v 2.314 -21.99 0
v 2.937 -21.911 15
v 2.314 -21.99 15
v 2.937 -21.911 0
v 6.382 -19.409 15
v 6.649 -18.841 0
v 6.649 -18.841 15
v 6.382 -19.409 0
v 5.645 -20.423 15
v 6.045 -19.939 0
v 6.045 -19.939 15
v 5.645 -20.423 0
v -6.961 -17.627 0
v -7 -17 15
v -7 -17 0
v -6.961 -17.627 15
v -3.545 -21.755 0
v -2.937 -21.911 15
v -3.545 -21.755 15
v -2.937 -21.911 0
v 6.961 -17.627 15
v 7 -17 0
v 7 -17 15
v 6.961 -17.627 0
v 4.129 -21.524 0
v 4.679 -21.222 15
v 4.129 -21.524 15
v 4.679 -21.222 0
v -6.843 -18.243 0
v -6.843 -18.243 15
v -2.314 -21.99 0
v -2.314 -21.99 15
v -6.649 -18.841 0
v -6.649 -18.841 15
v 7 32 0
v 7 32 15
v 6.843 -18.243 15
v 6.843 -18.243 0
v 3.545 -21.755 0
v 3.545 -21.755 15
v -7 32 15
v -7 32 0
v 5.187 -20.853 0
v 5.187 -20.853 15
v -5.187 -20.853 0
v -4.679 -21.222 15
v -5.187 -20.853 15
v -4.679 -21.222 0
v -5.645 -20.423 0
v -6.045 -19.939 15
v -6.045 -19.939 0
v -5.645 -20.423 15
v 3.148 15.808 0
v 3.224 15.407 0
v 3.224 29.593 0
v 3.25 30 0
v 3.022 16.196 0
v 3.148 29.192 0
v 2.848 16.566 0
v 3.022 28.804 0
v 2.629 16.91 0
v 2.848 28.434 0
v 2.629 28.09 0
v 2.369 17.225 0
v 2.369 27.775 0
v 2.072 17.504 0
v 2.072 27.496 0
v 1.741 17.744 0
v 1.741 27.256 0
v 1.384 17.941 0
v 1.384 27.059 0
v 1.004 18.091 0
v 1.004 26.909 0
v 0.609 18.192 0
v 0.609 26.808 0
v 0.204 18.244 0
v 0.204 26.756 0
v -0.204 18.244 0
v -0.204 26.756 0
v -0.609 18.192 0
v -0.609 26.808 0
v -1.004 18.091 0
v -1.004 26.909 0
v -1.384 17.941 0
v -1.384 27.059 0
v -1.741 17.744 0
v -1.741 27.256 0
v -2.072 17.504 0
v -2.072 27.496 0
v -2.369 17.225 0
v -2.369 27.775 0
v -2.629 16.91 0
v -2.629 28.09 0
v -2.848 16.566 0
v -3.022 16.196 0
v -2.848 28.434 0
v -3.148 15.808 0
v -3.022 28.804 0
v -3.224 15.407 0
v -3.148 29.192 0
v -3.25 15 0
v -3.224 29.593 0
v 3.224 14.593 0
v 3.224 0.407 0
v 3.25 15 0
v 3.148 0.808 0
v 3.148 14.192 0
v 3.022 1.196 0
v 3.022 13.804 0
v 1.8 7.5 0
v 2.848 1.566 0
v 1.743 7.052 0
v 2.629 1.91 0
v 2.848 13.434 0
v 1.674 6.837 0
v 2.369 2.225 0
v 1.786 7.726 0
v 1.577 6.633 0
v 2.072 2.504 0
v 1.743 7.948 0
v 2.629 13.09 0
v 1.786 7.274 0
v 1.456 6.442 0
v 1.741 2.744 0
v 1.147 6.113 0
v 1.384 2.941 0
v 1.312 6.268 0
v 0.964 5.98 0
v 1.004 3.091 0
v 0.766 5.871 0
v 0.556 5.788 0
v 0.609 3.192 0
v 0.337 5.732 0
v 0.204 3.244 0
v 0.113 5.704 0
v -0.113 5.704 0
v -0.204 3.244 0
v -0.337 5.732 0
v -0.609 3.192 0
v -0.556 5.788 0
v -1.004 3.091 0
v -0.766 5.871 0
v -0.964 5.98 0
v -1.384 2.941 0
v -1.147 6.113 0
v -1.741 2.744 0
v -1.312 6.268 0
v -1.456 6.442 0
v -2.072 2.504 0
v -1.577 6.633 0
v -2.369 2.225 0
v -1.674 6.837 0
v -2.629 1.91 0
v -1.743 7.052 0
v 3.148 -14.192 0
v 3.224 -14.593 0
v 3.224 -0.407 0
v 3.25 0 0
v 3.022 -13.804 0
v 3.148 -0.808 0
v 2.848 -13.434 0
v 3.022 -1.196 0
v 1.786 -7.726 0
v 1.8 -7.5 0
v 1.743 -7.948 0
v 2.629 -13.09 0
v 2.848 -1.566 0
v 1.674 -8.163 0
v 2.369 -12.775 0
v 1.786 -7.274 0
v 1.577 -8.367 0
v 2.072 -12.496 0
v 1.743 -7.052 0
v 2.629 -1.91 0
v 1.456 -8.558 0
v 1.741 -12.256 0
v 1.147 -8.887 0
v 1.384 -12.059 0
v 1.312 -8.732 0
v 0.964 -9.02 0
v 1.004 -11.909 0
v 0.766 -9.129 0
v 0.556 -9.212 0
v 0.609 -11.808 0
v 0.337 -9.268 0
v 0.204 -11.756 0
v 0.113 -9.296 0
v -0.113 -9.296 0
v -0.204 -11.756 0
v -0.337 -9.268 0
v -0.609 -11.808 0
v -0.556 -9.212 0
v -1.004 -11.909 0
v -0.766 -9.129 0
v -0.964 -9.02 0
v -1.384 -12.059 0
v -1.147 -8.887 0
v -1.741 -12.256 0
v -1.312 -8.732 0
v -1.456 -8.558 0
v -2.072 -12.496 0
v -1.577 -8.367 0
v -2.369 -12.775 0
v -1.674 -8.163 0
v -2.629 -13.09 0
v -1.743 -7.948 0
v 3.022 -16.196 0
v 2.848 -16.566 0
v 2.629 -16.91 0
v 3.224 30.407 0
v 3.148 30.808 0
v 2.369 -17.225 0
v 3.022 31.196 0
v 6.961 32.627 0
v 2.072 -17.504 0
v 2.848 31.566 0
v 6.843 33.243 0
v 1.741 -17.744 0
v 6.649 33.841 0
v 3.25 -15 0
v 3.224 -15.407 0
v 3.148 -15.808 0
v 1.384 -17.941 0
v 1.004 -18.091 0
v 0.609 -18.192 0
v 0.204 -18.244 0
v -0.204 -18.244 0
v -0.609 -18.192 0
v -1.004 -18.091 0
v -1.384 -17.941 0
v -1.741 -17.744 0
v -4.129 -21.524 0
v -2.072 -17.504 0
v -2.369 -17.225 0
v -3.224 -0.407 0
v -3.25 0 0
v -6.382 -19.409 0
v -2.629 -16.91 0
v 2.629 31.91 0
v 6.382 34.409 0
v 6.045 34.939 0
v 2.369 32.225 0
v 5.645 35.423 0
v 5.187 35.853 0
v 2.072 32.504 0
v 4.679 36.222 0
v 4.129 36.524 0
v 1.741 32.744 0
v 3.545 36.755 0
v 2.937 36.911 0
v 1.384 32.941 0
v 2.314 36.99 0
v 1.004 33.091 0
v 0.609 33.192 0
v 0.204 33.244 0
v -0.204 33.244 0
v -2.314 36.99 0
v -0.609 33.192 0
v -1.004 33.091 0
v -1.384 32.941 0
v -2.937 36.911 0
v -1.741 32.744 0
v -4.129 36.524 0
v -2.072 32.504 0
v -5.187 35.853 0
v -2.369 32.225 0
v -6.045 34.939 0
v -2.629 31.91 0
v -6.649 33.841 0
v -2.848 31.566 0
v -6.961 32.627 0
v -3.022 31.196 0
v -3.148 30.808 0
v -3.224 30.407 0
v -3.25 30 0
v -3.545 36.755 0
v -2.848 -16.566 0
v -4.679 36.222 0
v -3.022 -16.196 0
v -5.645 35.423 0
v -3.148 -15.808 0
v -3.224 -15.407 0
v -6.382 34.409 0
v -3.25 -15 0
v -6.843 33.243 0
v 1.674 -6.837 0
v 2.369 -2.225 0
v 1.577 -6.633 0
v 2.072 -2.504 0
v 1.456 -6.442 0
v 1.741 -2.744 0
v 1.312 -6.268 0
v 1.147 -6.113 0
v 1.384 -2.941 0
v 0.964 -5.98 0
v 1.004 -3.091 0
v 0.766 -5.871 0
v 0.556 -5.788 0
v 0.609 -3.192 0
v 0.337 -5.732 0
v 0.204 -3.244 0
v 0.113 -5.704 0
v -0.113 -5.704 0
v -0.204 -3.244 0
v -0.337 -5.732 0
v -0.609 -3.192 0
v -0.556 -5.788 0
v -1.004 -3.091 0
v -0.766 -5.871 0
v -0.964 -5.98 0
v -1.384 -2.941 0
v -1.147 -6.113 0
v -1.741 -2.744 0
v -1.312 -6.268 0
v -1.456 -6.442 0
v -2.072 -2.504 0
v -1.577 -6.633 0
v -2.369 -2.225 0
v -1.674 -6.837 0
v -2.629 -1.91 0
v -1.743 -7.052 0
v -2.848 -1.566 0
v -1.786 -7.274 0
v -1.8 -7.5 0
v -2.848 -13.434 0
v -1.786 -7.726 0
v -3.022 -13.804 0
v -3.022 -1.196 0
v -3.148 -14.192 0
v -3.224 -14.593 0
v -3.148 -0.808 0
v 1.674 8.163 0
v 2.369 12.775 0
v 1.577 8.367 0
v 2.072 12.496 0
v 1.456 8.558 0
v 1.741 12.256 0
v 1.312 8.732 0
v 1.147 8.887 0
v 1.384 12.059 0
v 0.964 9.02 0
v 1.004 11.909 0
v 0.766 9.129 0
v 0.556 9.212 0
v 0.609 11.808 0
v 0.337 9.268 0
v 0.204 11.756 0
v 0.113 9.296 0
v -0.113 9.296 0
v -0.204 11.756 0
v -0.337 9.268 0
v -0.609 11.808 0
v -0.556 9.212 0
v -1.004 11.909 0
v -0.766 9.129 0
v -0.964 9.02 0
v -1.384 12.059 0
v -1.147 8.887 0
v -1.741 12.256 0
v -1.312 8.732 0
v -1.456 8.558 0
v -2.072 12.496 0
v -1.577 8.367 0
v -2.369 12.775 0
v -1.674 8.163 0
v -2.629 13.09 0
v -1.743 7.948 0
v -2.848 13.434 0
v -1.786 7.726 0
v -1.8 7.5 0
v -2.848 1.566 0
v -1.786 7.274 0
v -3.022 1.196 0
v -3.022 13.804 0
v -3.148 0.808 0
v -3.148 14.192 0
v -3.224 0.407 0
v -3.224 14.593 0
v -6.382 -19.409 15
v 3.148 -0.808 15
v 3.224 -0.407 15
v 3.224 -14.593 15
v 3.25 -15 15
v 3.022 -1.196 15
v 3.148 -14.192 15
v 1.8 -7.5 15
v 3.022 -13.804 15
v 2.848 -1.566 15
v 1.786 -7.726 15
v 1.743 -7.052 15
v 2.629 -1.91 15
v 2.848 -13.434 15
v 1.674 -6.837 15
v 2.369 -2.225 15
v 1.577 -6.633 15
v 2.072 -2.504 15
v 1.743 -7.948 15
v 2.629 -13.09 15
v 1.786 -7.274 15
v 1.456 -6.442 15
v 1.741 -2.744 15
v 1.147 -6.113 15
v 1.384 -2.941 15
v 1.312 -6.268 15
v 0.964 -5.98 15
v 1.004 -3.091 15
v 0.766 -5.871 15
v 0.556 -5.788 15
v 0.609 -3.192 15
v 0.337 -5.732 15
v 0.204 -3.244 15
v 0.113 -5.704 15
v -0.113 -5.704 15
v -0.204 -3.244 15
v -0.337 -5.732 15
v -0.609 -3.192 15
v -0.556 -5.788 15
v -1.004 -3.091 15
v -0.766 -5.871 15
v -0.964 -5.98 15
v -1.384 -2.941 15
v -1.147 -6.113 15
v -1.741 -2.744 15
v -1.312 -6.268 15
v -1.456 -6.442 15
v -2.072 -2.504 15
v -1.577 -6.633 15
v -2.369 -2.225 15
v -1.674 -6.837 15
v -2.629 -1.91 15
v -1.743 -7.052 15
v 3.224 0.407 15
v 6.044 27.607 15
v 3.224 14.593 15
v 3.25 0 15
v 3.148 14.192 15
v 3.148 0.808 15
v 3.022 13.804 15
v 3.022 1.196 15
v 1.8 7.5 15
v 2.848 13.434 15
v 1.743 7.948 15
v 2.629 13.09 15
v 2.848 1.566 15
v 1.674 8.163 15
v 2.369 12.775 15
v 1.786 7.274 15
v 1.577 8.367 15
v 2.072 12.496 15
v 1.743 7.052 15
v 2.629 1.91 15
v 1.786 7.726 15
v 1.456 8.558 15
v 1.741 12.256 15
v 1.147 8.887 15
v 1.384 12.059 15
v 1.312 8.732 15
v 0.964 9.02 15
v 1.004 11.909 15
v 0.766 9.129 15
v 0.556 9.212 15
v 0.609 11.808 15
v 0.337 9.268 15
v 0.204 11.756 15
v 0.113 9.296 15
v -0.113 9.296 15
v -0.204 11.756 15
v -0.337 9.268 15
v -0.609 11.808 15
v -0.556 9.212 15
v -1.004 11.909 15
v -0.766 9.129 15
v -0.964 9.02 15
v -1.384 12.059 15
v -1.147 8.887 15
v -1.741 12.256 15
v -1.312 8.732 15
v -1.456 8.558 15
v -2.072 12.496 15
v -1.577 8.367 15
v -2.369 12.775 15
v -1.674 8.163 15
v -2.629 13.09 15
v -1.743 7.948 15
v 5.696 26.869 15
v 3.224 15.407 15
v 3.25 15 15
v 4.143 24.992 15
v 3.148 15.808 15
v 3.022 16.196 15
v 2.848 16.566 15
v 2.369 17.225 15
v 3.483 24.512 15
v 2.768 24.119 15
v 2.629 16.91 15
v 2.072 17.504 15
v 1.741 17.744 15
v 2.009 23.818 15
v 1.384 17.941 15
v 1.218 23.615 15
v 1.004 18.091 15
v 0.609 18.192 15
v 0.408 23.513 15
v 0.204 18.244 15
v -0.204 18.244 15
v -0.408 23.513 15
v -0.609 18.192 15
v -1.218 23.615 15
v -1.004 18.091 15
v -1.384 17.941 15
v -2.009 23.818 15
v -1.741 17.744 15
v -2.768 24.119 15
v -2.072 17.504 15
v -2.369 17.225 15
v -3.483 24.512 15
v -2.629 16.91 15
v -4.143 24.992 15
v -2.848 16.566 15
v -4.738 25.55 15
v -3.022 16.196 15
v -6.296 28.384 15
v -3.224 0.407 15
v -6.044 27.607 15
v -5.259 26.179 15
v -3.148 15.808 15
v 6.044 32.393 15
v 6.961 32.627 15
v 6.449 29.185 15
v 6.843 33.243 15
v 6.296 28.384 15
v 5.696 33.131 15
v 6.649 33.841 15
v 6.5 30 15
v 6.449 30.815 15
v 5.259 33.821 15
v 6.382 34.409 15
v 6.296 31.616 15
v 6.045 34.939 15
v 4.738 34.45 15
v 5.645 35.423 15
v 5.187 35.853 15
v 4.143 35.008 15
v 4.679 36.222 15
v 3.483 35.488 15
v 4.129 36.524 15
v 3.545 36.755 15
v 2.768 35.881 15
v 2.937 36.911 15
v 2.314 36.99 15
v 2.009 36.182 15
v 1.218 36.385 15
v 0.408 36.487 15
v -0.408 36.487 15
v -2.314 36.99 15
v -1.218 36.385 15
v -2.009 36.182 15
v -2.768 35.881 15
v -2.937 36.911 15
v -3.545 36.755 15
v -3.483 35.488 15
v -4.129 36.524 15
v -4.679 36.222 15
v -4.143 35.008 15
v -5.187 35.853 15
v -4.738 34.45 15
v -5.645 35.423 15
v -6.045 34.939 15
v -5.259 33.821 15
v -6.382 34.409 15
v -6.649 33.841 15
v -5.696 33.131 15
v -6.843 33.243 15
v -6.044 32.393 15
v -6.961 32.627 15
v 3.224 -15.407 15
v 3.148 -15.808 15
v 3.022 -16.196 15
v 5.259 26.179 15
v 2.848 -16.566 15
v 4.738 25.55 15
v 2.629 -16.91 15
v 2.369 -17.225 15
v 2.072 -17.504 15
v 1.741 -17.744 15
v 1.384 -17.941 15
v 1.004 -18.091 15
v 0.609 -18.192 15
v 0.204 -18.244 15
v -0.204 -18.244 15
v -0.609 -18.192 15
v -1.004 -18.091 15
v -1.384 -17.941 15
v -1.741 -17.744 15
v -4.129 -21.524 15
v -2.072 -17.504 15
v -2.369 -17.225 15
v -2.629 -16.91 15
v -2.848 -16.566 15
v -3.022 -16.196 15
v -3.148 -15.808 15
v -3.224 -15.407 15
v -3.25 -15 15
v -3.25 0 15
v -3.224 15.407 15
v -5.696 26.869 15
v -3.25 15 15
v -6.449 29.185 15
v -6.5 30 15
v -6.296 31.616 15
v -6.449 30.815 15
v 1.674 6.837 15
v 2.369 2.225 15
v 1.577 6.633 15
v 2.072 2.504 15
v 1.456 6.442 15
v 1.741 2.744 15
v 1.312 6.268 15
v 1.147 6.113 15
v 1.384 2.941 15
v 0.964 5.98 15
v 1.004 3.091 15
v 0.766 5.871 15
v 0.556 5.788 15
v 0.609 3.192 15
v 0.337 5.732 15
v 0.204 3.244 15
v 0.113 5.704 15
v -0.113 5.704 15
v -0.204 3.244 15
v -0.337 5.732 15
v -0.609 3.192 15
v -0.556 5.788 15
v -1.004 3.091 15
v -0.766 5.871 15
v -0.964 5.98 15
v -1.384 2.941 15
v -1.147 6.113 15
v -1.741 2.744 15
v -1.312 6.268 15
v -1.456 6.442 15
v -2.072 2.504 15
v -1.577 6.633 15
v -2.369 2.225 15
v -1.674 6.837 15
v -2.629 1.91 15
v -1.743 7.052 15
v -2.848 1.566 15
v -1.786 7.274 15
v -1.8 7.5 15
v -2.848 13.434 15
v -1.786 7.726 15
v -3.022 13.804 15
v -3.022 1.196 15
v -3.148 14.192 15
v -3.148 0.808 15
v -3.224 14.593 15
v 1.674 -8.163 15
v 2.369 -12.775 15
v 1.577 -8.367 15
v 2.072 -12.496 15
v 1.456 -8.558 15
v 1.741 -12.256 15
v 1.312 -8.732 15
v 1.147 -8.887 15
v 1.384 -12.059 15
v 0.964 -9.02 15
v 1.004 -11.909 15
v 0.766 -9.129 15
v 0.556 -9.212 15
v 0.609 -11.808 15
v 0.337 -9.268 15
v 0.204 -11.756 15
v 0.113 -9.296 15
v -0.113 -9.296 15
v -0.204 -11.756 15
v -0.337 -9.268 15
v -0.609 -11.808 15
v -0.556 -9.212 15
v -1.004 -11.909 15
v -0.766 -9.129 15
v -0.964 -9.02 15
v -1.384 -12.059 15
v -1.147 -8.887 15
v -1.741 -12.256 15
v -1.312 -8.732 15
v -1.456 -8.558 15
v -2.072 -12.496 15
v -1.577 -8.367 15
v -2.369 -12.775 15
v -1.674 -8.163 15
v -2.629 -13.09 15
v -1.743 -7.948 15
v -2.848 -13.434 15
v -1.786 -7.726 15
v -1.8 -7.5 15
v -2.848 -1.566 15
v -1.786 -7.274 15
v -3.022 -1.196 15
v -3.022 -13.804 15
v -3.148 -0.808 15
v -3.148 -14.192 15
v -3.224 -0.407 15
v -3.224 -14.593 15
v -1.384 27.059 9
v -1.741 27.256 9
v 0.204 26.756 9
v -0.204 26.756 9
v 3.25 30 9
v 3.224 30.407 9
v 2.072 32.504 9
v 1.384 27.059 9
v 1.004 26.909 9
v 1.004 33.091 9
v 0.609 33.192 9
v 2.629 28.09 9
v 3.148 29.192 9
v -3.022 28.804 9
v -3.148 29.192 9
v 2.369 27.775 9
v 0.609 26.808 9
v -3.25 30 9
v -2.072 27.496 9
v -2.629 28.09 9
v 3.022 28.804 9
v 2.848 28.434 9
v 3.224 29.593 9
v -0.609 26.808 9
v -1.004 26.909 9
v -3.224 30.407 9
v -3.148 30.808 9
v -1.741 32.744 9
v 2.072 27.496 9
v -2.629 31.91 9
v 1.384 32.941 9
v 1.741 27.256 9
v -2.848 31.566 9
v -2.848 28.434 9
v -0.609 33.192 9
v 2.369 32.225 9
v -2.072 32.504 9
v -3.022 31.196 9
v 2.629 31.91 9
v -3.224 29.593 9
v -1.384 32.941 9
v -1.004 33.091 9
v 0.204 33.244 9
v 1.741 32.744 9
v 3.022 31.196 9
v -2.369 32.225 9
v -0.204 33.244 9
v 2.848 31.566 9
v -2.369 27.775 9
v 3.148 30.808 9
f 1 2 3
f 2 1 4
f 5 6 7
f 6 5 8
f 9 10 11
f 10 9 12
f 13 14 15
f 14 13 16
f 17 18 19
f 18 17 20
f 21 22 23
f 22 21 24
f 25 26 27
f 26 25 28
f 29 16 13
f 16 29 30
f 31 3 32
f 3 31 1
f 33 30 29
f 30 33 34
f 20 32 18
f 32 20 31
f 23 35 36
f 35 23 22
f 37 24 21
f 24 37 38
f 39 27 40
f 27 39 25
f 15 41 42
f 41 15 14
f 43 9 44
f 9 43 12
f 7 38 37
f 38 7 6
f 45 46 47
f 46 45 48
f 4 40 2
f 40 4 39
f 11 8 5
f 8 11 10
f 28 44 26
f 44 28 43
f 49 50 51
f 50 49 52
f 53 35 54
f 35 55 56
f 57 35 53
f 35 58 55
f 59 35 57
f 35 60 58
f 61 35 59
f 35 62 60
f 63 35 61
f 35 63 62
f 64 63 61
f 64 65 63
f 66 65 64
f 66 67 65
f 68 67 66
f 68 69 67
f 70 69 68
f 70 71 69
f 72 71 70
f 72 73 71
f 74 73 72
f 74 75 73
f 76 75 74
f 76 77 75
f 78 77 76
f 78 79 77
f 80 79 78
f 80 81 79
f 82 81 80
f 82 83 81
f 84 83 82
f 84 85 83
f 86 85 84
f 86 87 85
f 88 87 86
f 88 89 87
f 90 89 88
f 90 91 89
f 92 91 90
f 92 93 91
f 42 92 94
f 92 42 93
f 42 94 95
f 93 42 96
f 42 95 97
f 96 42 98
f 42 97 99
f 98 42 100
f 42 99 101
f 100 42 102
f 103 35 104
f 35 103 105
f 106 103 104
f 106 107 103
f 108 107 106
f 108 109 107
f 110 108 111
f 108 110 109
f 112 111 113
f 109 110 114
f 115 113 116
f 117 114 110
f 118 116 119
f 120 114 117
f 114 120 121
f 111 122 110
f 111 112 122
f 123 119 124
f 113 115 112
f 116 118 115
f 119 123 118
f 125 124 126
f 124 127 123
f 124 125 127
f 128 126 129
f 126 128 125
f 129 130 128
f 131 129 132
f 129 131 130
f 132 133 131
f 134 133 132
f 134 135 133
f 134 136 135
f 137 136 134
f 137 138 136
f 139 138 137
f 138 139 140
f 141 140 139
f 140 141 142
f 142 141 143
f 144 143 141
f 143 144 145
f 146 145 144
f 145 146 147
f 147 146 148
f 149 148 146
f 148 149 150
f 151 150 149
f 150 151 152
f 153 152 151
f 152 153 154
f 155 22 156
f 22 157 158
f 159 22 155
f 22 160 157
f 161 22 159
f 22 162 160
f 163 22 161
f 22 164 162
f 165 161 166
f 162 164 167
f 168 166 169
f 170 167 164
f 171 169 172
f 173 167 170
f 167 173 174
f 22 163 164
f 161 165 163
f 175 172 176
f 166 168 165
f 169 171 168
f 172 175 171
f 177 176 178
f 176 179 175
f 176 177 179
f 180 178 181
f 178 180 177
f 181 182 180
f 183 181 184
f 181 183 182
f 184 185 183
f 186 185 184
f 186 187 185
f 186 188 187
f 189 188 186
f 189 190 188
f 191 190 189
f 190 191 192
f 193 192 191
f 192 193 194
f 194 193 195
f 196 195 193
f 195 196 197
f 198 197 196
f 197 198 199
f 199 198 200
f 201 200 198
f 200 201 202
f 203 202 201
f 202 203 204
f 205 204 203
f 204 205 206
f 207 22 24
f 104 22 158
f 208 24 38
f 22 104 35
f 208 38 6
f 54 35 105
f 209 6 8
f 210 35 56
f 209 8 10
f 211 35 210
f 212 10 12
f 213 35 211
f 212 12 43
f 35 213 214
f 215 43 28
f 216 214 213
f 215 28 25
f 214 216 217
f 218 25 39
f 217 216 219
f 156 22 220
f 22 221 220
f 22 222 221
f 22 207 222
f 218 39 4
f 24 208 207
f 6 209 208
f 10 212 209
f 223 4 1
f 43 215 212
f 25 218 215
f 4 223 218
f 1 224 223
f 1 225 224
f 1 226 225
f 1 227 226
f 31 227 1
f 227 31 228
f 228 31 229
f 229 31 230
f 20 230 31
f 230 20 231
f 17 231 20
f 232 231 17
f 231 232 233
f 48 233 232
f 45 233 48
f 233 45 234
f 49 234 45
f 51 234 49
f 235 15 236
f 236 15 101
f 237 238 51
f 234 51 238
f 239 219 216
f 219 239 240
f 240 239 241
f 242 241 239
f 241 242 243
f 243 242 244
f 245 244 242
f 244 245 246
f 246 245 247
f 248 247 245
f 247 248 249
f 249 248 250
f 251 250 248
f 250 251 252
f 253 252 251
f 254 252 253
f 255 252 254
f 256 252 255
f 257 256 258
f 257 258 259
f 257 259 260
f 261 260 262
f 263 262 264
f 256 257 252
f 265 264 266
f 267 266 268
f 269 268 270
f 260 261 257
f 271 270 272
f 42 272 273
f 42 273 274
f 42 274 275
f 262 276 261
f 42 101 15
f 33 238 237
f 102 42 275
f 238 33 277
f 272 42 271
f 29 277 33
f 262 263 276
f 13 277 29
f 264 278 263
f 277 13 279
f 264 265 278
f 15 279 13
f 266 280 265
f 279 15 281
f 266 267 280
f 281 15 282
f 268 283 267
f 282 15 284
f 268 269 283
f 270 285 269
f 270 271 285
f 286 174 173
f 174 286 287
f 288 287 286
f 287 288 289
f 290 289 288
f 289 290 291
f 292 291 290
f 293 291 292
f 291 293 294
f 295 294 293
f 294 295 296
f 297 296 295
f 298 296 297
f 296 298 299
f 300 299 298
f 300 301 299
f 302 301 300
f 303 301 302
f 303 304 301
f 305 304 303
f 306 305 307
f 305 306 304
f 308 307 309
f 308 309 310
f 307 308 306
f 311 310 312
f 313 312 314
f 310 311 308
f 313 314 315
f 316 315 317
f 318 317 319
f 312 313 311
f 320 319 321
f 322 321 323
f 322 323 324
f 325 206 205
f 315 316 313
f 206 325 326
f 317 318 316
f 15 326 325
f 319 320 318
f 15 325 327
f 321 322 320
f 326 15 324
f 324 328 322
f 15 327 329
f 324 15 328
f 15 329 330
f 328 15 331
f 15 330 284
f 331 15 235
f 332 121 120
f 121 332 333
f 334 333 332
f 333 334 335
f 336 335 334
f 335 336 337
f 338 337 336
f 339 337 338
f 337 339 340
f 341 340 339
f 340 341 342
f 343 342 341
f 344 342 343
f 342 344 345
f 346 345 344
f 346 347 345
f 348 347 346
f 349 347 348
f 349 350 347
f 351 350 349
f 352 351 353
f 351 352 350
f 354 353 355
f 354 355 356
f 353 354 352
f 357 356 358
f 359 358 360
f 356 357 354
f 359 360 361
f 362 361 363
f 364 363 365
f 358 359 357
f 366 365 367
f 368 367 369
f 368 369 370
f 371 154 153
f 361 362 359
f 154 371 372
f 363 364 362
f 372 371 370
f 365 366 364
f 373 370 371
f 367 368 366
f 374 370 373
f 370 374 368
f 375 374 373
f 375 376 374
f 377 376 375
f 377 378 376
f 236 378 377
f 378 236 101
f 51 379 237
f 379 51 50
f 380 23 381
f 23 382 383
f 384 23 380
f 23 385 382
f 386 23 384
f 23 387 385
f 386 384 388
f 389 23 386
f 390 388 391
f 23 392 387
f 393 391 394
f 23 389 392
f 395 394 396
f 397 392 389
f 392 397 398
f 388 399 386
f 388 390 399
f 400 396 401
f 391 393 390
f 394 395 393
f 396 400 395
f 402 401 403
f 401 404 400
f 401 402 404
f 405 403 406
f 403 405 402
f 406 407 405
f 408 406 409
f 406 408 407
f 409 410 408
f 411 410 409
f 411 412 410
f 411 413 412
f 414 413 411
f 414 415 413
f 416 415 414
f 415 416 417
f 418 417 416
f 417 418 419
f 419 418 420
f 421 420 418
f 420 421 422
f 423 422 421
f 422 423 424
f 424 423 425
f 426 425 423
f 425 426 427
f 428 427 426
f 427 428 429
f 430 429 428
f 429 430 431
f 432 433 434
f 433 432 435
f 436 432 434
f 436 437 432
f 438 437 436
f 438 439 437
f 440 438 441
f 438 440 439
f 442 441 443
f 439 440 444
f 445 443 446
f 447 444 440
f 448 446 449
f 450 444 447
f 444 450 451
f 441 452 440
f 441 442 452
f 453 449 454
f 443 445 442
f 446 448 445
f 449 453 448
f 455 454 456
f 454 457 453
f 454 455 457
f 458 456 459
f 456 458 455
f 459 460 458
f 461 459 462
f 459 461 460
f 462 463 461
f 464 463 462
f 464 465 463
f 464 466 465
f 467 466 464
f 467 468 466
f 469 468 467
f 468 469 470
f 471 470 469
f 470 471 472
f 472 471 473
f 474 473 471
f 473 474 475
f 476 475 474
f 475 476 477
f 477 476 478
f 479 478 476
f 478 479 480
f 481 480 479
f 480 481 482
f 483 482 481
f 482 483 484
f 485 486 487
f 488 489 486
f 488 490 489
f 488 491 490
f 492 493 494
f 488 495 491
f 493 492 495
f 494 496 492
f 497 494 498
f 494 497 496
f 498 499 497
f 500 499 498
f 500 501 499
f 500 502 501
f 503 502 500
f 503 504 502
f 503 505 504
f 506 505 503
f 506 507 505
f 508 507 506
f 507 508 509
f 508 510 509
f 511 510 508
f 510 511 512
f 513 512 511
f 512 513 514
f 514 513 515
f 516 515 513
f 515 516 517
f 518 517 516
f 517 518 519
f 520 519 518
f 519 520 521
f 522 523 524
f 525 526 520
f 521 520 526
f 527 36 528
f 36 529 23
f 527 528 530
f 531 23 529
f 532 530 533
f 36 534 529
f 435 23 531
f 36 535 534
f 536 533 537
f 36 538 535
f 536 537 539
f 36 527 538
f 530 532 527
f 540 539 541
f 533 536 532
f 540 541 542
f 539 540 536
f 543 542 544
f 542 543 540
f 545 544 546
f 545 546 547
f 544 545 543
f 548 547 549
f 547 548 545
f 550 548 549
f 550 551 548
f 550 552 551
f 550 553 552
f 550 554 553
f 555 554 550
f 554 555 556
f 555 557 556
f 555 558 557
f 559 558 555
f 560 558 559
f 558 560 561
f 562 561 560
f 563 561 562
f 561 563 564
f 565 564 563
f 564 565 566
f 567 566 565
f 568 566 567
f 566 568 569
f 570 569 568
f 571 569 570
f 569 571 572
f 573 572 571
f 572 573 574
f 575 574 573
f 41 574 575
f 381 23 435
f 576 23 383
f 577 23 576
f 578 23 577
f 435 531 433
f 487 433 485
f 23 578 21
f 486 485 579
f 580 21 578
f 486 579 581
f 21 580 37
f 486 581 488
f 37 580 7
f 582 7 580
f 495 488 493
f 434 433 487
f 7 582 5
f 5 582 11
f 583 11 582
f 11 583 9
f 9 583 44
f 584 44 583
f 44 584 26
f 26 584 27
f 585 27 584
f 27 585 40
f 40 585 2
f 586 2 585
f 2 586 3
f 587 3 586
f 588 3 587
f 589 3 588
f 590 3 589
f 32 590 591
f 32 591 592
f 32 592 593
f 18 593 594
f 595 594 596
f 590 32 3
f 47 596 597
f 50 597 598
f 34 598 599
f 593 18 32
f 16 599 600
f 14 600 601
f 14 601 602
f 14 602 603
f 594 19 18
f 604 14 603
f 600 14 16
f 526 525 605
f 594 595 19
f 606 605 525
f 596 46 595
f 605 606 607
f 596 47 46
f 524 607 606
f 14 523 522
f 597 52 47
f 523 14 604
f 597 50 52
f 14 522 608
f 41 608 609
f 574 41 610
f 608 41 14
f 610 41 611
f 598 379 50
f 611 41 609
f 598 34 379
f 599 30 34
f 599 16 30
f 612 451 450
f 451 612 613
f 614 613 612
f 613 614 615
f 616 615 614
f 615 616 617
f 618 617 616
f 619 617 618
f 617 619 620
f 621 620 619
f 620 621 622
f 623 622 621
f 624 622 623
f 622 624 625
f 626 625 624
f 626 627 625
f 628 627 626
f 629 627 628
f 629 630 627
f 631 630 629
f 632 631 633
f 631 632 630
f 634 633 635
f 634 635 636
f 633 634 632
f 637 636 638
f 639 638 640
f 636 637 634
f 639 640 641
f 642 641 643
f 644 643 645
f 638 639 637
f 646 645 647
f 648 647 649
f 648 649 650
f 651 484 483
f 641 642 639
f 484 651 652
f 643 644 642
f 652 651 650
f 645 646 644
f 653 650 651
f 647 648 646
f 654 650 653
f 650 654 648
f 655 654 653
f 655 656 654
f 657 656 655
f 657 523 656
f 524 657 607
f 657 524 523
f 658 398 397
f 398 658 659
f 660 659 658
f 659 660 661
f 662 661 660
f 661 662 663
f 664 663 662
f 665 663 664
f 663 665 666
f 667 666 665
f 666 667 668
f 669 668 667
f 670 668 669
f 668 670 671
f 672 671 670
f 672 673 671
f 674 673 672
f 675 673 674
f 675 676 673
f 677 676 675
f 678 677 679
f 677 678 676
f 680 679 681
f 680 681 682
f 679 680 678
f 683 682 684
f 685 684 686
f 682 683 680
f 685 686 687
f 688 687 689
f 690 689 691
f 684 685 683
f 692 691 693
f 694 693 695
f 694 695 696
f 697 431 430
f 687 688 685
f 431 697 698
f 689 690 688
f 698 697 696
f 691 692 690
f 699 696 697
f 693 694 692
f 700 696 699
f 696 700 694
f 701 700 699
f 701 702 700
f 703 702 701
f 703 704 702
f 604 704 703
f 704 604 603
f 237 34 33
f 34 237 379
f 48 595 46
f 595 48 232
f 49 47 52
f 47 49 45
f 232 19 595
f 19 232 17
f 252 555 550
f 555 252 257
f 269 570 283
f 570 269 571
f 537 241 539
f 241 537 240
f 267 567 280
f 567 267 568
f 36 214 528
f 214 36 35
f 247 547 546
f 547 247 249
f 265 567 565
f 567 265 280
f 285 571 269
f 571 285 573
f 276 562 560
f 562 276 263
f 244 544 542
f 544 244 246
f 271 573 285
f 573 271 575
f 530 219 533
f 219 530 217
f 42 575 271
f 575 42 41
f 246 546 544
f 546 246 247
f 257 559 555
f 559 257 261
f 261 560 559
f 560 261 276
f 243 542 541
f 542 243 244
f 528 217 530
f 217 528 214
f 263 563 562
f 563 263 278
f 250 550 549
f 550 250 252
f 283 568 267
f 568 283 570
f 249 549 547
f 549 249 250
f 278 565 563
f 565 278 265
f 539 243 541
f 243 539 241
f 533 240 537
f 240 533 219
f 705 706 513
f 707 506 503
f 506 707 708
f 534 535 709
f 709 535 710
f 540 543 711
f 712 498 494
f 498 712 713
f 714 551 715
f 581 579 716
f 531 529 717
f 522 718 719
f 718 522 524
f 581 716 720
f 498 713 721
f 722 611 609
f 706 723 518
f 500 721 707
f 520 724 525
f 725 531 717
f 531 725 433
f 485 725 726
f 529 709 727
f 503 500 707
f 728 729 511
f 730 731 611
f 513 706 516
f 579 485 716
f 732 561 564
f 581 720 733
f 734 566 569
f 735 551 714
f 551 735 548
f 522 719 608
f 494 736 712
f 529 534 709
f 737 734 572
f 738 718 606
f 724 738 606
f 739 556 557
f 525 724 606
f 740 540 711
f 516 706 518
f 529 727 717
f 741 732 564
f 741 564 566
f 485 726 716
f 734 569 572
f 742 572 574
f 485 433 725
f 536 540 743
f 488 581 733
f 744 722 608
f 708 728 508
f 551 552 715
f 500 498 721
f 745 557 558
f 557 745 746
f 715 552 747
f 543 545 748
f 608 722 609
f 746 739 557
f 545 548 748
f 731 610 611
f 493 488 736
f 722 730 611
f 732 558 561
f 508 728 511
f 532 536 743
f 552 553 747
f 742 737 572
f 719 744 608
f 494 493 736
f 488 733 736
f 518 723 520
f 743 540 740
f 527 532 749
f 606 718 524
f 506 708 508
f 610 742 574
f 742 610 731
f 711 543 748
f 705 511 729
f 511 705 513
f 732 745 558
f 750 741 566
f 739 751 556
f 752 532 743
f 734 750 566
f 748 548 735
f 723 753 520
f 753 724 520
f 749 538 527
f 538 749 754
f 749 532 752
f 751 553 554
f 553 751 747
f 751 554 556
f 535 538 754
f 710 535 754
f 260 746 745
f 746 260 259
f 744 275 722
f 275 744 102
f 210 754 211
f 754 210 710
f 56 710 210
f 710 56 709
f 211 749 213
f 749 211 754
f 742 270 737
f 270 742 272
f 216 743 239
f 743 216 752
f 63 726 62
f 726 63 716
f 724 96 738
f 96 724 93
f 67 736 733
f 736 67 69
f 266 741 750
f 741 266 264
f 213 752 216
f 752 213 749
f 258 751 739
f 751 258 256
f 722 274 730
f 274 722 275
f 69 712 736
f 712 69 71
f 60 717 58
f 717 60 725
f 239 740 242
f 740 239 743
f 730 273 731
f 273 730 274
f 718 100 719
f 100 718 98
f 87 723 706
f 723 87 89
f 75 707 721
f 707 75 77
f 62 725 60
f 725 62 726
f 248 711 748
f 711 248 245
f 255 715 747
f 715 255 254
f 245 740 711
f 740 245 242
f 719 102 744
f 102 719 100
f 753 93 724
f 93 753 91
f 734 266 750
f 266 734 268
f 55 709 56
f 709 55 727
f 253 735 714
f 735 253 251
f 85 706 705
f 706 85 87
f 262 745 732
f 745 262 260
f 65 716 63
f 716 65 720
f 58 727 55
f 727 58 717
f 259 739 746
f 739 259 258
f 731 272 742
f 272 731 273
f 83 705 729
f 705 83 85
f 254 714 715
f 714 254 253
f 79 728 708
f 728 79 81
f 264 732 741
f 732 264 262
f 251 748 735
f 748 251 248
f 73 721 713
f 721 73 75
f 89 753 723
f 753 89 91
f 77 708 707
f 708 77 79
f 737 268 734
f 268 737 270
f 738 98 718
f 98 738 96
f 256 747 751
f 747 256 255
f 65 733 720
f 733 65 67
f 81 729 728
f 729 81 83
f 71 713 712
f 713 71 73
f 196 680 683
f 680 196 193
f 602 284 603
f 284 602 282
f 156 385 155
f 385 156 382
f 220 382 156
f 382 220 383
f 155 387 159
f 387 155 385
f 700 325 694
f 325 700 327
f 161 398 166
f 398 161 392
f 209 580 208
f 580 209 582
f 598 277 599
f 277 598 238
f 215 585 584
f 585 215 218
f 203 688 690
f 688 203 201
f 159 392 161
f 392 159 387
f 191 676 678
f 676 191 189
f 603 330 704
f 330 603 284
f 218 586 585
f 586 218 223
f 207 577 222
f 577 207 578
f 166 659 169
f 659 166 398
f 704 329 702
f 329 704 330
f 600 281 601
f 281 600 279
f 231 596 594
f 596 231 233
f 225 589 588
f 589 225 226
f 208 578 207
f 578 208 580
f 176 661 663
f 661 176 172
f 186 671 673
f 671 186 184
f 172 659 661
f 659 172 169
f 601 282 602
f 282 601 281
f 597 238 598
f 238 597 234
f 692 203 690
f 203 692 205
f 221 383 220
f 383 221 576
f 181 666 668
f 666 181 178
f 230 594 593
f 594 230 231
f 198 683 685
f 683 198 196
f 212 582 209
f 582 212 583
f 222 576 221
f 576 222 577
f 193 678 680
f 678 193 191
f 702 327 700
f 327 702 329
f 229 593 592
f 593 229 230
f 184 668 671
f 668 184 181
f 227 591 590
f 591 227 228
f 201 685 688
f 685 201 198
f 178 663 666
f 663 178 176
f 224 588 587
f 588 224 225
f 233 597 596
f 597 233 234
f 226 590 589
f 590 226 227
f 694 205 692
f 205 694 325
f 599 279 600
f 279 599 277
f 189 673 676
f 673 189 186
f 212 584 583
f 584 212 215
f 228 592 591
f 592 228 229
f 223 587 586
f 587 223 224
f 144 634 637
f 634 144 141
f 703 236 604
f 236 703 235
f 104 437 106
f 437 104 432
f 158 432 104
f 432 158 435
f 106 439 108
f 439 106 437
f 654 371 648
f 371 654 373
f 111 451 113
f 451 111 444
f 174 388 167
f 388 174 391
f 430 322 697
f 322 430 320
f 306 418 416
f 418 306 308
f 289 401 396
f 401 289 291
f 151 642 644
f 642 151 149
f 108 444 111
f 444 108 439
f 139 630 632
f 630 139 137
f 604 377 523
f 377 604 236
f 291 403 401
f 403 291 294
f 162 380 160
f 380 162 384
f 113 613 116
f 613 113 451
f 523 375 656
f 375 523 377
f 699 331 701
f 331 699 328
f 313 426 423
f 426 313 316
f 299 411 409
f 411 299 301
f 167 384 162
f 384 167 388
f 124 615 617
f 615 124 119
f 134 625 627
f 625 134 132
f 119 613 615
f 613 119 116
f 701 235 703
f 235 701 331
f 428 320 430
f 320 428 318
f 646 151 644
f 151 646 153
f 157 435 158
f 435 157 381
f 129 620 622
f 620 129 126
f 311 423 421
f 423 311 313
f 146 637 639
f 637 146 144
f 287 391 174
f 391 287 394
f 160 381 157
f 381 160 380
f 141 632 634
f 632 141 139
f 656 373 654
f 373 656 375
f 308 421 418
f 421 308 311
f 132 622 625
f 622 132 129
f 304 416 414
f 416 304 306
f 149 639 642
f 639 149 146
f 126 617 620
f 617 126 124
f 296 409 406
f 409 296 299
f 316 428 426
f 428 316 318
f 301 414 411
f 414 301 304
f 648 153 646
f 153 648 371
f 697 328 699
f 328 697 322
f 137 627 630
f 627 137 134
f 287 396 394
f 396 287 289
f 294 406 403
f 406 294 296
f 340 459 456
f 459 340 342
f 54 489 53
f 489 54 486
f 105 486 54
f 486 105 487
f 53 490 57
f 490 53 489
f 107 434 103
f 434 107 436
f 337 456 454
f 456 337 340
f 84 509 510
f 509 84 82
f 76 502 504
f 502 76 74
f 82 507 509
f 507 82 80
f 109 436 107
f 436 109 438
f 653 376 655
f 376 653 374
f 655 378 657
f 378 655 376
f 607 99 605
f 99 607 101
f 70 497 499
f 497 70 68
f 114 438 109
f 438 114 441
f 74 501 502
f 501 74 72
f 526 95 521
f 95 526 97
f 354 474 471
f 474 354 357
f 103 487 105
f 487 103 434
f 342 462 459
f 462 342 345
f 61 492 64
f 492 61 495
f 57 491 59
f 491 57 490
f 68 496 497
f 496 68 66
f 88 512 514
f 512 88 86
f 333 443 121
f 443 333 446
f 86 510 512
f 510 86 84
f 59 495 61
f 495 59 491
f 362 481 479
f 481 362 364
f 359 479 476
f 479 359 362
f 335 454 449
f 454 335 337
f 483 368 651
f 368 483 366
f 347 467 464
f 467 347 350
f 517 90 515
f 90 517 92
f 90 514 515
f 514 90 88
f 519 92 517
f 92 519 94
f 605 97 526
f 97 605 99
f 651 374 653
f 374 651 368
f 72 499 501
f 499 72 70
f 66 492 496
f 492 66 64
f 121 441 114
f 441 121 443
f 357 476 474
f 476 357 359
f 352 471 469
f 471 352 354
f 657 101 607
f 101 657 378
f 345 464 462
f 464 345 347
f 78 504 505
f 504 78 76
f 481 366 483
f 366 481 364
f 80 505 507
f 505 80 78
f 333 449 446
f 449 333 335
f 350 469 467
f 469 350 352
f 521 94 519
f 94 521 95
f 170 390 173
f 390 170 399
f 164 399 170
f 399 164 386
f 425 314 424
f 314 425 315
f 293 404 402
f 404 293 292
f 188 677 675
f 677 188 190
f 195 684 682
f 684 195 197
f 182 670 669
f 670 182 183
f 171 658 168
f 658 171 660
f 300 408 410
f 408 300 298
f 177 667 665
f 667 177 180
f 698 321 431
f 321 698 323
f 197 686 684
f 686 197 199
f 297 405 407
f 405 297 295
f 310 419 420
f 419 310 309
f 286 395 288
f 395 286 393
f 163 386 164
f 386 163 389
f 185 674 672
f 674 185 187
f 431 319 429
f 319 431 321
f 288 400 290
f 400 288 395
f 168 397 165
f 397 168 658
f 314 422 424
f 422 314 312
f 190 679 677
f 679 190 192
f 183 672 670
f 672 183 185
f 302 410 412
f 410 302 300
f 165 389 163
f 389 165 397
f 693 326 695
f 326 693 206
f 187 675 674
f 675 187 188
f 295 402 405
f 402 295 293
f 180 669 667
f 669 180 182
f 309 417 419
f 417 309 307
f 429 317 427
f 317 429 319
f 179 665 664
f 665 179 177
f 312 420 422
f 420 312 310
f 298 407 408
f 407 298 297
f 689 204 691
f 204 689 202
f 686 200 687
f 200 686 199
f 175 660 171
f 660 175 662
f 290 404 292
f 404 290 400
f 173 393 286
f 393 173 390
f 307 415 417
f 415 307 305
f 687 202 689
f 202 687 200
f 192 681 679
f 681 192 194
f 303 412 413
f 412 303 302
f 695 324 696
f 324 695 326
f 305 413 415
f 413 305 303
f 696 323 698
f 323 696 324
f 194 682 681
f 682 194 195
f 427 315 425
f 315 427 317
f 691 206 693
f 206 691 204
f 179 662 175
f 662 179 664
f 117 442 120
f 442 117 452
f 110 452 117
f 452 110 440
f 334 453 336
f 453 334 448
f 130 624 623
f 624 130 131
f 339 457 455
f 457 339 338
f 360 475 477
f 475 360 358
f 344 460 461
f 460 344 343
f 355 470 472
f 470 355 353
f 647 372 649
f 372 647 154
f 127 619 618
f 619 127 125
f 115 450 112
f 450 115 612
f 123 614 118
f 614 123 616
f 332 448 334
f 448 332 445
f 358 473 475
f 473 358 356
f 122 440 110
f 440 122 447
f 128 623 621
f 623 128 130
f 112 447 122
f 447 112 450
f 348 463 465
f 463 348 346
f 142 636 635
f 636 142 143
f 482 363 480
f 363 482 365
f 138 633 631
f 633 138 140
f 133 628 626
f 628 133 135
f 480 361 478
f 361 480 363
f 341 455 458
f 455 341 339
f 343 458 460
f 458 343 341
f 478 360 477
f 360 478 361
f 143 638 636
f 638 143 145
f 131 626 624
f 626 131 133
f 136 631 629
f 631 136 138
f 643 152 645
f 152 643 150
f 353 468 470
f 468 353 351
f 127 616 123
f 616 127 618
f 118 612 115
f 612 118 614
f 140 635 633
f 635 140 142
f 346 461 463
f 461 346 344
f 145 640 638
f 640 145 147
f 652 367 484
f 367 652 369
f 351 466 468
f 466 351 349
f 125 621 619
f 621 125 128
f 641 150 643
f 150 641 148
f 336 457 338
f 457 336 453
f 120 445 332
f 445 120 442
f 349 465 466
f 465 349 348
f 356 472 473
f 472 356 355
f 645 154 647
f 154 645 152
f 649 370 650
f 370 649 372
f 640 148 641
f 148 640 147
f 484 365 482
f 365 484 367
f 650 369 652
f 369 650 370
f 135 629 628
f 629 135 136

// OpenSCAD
$fn = 50;


difference() {
	union() {
		hull() {
			translate(v = [-2.0000000000, 17.0000000000, 0]) {
				cylinder(h = 15, r = 5);
			}
			translate(v = [2.0000000000, 17.0000000000, 0]) {
				cylinder(h = 15, r = 5);
			}
			translate(v = [-2.0000000000, -17.0000000000, 0]) {
				cylinder(h = 15, r = 5);
			}
			translate(v = [2.0000000000, -17.0000000000, 0]) {
				cylinder(h = 15, r = 5);
			}
		}
		translate(v = [0.0000000000, 22.5000000000, 0]) {
			hull() {
				translate(v = [-2.0000000000, 9.5000000000, 0]) {
					cylinder(h = 15, r = 5);
				}
				translate(v = [2.0000000000, 9.5000000000, 0]) {
					cylinder(h = 15, r = 5);
				}
				translate(v = [-2.0000000000, -9.5000000000, 0]) {
					cylinder(h = 15, r = 5);
				}
				translate(v = [2.0000000000, -9.5000000000, 0]) {
					cylinder(h = 15, r = 5);
				}
			}
		}
		translate(v = [0.0000000000, 22.5000000000, 0]) {
			hull() {
				translate(v = [-2.0000000000, 9.5000000000, 0]) {
					cylinder(h = 15, r = 5);
				}
				translate(v = [2.0000000000, 9.5000000000, 0]) {
					cylinder(h = 15, r = 5);
				}
				translate(v = [-2.0000000000, -9.5000000000, 0]) {
					cylinder(h = 15, r = 5);
				}
				translate(v = [2.0000000000, -9.5000000000, 0]) {
					cylinder(h = 15, r = 5);
				}
			}
		}
	}
	union() {
		translate(v = [0.0000000000, 30.0000000000, 15]) {
			rotate(a = [0, 0, 0]) {
				difference() {
					union() {
						#translate(v = [0, 0, -15.0000000000]) {
							cylinder(h = 15, r = 2.2500000000);
						}
						#translate(v = [0, 0, -6]) {
							cylinder(h = 6, r1 = 3.2500000000, r2 = 6.5000000000);
						}
						#translate(v = [0, 0, -15.0000000000]) {
							cylinder(h = 15, r = 3.2500000000);
						}
						#translate(v = [0, 0, -15.0000000000]) {
							cylinder(h = 15, r = 2.2500000000);
						}
					}
					union();
				}
			}
		}
		translate(v = [0.0000000000, 30.0000000000, 15]) {
			rotate(a = [0, 0, 0]) {
				difference() {
					union() {
						#translate(v = [0, 0, -15.0000000000]) {
							cylinder(h = 15, r = 2.2500000000);
						}
						#translate(v = [0, 0, -6]) {
							cylinder(h = 6, r1 = 3.2500000000, r2 = 6.5000000000);
						}
						#translate(v = [0, 0, -15.0000000000]) {
							cylinder(h = 15, r = 3.2500000000);
						}
						#translate(v = [0, 0, -15.0000000000]) {
							cylinder(h = 15, r = 2.2500000000);
						}
					}
					union();
				}
			}
		}
		translate(v = [0.0000000000, -15.0000000000, 0]) {
			translate(v = [0, 0, -100]) {
				cylinder(h = 200, r = 3.2500000000);
			}
		}
		translate(v = [0, 0, -100]) {
			cylinder(h = 200, r = 3.2500000000);
		}
		translate(v = [0.0000000000, 15.0000000000, 0]) {
			translate(v = [0, 0, -100]) {
				cylinder(h = 200, r = 3.2500000000);
			}
		}
		translate(v = [0.0000000000, -15.0000000000, 0]) {
			translate(v = [0, 0, -100]) {
				cylinder(h = 200, r = 1.8000000000);
			}
		}
		translate(v = [0.0000000000, -7.5000000000, 0]) {
			translate(v = [0, 0, -100]) {
				cylinder(h = 200, r = 1.8000000000);
			}
		}
		translate(v = [0, 0, -100]) {
			cylinder(h = 200, r = 1.8000000000);
		}
		translate(v = [0.0000000000, 7.5000000000, 0]) {
			translate(v = [0, 0, -100]) {
				cylinder(h = 200, r = 1.8000000000);
			}
		}
		translate(v = [0.0000000000, 15.0000000000, 0]) {
			translate(v = [0, 0, -100]) {
				cylinder(h = 200, r = 1.8000000000);
			}
		}
	}
}
